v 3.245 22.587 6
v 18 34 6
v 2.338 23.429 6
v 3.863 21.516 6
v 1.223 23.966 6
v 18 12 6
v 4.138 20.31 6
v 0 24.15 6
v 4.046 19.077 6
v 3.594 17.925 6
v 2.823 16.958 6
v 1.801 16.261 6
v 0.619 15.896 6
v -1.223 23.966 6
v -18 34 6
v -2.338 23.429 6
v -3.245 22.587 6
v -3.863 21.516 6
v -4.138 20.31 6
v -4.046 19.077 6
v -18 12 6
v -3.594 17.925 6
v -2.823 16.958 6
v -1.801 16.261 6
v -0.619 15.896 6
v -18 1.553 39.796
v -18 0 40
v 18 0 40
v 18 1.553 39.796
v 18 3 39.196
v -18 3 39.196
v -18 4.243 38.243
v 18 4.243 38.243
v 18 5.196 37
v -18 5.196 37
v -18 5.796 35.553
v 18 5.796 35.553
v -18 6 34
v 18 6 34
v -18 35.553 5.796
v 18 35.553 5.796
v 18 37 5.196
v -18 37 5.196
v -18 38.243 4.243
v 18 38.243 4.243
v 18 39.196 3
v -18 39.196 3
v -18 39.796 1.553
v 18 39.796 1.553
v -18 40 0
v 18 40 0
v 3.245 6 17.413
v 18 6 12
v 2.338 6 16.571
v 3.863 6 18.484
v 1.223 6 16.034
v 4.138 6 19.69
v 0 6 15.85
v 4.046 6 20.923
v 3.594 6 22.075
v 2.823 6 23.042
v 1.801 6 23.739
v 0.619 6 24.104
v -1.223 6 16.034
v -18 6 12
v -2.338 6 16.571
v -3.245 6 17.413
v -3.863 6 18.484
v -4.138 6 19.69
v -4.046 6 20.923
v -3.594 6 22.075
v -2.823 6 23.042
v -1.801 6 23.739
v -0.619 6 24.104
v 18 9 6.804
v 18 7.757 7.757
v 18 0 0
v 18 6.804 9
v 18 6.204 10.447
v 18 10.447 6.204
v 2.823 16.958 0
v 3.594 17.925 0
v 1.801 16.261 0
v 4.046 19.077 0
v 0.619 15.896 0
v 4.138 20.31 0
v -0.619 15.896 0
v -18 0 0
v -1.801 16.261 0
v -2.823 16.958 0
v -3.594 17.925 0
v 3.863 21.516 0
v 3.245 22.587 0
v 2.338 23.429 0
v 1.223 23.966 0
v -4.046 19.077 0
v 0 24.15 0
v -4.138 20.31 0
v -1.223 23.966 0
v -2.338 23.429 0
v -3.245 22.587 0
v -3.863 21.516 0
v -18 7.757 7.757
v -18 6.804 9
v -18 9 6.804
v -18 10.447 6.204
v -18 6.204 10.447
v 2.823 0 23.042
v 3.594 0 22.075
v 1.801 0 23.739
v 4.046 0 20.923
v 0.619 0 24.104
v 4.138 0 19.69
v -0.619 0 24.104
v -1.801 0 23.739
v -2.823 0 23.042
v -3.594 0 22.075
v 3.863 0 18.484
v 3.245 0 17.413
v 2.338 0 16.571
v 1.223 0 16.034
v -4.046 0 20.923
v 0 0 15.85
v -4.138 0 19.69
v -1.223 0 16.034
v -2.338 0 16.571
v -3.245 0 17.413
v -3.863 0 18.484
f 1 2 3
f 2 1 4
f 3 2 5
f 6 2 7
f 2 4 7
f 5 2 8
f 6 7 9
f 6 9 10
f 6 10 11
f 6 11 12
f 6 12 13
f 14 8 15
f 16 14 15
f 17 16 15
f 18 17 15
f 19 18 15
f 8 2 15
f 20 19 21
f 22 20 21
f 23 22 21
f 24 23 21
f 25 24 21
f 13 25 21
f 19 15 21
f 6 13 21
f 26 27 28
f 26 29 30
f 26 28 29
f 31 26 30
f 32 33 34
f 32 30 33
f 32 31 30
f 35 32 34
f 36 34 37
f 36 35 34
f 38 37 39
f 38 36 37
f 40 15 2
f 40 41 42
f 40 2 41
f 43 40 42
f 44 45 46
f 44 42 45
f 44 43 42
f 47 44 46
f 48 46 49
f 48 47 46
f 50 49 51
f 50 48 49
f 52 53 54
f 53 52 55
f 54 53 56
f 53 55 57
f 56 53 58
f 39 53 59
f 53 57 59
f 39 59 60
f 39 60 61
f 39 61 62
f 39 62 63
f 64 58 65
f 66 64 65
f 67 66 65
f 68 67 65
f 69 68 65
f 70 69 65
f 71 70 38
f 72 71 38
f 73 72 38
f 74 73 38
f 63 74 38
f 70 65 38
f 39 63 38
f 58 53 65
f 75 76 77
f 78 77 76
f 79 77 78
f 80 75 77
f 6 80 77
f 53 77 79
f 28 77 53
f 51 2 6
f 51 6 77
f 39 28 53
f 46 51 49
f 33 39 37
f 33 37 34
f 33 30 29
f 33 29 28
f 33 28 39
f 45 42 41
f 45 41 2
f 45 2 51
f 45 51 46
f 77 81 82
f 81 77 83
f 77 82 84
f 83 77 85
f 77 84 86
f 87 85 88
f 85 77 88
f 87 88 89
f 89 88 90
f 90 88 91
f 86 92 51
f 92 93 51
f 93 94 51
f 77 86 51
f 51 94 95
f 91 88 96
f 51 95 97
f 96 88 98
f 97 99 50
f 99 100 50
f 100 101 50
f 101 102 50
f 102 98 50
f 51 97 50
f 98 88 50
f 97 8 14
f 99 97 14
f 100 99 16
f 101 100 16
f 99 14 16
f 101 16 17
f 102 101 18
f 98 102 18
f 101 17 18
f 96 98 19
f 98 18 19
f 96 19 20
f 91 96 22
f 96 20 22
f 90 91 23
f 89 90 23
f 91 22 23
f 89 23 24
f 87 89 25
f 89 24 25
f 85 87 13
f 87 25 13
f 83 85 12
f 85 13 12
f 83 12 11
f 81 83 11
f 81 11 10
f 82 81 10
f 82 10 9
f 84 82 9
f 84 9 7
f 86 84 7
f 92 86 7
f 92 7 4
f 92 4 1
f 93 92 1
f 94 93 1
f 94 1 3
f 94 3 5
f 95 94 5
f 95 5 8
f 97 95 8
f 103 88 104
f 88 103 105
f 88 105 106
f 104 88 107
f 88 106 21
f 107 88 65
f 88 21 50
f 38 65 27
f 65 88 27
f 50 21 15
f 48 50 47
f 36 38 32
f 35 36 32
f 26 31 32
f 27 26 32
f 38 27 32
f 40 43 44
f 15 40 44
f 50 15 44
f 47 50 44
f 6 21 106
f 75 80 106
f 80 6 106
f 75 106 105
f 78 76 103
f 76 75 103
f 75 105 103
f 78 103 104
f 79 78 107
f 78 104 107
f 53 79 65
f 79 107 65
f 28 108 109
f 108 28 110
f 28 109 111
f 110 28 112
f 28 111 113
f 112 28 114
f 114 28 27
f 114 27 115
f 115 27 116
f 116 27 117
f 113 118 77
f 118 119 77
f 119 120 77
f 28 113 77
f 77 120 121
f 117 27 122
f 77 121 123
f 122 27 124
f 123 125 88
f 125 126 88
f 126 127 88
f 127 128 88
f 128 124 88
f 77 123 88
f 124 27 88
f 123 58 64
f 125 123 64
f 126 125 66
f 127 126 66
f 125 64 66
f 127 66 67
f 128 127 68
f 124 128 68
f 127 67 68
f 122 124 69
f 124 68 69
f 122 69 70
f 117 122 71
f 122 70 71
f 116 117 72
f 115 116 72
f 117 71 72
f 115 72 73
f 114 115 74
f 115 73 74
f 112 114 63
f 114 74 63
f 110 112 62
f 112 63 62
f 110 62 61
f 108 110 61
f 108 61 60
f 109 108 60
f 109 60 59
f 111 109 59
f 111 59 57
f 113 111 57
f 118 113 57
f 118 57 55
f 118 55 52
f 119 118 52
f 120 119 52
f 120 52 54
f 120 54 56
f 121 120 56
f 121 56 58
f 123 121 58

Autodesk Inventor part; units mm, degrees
ref_plane "YZ Plane" through (0, 0, 0) normal (1, 0, 0) x (0, 1, 0)
ref_plane "XZ Plane" through (0, 0, 0) normal (0, 1, 0) x (-1, 0, 0)
ref_plane "XY Plane" through (0, 0, 0) normal (0, 0, 1) x (1, 0, 0)
sketch "Sketch_1" plane through (0, 0, 0) normal (1, 0, 0) x (0, 1, 0)
  line L0 (0, 40) -> (0, 0)
  line L1 (0, 0) -> (40, 0)
  arc A0 (40, 0) -> (34, 6) centre (34, 0) ccw
  line L2 (34, 6) -> (12, 6)
  arc A1 (6, 12) -> (12, 6) centre (12, 12) ccw
  line L3 (6, 12) -> (6, 34)
  arc A2 (6, 34) -> (0, 40) centre (0, 34) ccw
extrude "Extrusion1" add sketch "Sketch_1" along normal mid plane 36
sketch "Sketch2" plane through (18, 40, 0) normal (0, 0, -1) x (-1, 0, 0)
  point P0 (18, -20)
hole "Hole1" at (0, 20, 0) direction (0, 0, 1) diameter 8.3 depth 6
sketch "Sketch3" plane through (-18, 0, 0) normal (0, -1, 0) x (1, 0, 0)
  point P0 (18, 20)
hole "Hole2" at (0, 0, 20) direction (0, 1, 0) diameter 8.3 depth 6
properties part number "40-4302 Aluminum"
